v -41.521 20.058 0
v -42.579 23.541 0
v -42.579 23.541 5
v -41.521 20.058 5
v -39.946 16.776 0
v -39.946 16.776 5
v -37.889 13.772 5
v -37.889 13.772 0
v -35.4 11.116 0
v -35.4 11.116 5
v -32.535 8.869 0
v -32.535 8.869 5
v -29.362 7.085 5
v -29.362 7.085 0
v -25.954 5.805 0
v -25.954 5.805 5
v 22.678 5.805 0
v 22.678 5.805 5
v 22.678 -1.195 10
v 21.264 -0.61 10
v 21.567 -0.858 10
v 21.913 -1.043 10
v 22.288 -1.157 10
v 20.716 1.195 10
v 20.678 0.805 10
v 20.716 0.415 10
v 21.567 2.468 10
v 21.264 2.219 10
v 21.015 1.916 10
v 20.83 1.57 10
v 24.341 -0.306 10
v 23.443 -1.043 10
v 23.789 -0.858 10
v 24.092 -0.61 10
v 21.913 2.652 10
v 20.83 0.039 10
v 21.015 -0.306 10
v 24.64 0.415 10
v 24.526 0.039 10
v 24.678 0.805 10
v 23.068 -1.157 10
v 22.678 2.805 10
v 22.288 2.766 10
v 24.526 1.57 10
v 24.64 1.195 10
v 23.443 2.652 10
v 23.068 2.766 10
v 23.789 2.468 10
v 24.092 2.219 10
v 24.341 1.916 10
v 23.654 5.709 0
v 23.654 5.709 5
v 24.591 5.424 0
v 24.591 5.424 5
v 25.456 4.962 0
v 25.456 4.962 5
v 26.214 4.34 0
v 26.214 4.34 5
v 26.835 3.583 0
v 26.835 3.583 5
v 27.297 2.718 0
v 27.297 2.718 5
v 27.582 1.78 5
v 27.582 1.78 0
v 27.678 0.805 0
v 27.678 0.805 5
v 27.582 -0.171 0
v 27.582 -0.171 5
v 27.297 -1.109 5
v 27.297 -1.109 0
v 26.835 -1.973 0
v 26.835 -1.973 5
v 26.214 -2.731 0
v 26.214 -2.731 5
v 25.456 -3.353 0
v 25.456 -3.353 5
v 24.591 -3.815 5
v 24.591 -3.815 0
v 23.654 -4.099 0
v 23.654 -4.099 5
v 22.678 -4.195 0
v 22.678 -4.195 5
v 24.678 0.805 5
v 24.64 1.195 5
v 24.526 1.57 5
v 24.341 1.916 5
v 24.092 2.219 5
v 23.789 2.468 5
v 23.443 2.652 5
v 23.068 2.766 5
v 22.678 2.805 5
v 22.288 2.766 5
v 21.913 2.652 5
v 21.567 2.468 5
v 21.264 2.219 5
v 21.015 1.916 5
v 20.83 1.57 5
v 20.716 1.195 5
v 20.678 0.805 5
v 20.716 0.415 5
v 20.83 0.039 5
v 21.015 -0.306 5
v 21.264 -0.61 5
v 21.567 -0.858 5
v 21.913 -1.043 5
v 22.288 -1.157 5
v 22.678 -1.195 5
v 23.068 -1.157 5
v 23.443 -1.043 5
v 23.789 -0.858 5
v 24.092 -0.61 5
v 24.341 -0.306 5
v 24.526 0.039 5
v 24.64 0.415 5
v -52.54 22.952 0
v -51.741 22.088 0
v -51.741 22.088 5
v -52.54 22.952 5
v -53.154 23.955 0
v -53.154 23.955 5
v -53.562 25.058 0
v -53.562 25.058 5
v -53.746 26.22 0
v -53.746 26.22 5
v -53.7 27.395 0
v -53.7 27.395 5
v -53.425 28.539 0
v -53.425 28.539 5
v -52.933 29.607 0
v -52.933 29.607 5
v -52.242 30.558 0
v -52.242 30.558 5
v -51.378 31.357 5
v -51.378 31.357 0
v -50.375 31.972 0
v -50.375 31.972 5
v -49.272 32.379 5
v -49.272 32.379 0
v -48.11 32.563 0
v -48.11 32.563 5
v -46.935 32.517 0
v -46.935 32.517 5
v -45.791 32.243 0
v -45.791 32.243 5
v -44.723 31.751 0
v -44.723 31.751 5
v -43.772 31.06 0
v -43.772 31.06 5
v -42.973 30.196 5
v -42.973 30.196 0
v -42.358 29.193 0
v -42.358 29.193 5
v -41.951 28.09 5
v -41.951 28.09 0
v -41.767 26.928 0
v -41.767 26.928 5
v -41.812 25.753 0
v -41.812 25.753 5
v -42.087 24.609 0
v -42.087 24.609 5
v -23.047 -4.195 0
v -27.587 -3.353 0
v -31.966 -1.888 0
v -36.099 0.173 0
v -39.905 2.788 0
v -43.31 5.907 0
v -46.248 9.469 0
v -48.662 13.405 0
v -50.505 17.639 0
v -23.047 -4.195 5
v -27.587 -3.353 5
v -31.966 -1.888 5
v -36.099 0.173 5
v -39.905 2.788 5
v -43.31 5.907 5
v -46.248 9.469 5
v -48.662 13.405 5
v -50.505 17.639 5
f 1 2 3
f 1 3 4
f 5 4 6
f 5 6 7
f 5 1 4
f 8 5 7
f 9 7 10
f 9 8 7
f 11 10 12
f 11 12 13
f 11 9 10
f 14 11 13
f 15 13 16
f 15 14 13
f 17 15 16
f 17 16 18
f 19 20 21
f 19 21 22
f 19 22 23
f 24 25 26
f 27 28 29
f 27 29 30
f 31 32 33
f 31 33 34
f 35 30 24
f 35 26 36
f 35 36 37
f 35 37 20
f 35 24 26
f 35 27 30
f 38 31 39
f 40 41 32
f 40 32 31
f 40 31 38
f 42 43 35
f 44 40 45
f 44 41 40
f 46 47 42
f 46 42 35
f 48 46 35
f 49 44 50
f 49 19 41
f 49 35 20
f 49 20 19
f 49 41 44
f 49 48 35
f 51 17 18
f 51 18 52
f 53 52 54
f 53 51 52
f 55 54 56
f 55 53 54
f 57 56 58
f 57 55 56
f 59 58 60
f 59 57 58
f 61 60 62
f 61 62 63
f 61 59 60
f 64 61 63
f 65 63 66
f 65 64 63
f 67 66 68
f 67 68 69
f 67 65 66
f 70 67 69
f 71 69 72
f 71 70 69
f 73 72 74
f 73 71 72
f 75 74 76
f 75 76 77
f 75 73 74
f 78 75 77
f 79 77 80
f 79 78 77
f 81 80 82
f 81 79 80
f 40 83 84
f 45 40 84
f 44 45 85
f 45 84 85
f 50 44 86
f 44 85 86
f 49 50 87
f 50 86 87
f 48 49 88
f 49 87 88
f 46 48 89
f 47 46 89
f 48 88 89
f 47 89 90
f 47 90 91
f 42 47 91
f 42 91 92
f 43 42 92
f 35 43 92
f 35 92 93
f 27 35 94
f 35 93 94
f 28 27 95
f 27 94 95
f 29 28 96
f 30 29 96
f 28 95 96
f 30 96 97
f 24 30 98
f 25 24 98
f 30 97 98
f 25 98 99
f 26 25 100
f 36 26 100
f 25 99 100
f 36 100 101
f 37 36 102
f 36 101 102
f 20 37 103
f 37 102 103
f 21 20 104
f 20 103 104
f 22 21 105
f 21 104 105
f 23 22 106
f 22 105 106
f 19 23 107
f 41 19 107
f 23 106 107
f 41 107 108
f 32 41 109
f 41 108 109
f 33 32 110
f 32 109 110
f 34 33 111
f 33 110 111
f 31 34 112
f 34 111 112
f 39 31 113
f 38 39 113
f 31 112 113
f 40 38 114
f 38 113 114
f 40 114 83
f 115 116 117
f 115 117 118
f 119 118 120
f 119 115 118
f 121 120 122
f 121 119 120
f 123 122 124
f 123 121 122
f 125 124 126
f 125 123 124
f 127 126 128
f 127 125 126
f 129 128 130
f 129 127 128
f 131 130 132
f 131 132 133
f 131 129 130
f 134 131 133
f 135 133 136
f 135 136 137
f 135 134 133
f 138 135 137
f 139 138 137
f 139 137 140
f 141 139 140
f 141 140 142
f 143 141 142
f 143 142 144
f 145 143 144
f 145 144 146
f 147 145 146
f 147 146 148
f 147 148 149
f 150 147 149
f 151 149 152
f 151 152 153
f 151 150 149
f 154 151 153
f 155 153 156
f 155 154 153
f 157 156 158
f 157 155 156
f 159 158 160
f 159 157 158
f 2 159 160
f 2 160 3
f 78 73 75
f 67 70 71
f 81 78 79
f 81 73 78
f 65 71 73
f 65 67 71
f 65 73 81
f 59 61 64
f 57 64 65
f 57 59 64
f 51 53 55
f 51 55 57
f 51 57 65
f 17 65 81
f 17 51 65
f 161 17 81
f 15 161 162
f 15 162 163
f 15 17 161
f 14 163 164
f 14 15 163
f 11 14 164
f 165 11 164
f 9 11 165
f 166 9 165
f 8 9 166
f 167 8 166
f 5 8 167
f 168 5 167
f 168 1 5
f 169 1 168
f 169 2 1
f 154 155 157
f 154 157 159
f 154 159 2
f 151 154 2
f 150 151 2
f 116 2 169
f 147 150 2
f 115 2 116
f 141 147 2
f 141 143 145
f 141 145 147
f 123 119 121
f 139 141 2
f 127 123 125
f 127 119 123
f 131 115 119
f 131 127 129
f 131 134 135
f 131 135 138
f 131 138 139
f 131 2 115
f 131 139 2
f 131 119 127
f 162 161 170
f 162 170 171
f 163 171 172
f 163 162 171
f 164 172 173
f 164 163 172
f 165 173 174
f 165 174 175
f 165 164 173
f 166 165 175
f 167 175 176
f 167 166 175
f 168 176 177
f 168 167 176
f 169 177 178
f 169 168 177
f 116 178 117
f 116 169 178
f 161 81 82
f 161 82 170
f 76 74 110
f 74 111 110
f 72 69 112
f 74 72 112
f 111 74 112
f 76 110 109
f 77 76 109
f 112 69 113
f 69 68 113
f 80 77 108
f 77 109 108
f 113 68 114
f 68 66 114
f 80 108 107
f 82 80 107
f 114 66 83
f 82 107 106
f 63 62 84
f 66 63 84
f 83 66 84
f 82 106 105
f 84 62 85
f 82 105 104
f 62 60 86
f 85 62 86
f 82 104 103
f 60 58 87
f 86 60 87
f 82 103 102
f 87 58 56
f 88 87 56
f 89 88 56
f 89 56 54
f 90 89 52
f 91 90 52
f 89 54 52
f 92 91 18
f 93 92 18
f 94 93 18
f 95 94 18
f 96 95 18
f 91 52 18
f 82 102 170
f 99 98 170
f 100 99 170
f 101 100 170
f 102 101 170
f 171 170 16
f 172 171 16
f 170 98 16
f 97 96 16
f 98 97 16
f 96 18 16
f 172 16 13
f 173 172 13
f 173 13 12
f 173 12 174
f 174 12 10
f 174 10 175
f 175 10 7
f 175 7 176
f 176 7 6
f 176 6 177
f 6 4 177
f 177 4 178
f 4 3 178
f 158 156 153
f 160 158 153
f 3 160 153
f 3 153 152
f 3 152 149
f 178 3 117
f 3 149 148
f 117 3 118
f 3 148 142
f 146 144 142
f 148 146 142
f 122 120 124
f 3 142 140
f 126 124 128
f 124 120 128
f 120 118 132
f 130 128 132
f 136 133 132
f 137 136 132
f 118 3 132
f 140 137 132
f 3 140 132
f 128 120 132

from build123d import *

# Parameters (mm, degrees)
SALIENTE_EXTRUIR1_DEPTH = 5
CROQUIS2_R              = 2
SALIENTE_EXTRUIR2_DEPTH = 5


with BuildPart() as part:
    # Croquis1 → Saliente-Extruir1 (new body)
    with BuildSketch(Plane.XY):
        with BuildLine():
            Line((-25.953664325, 5.804713338), (22.678050908, 5.804713338))
            ThreePointArc((22.678050908, 5.804713338), (27.678050908, 0.804713338), (22.678050908, -4.195286662))
            Line((22.678050908, -4.195286662), (-23.047151147, -4.195286662))
            ThreePointArc((-23.047151147, -4.195286662), (-41.661617991, 4.287687085), (-51.741257509, 22.088251307))
            ThreePointArc((-51.741257509, 22.088251307), (-48.695784379, 32.499543684), (-42.578743977, 23.541210565))
            ThreePointArc((-42.578743977, 23.541210565), (-36.695300038, 12.396079877), (-25.953664325, 5.804713338))
        make_face()
    extrude(amount=SALIENTE_EXTRUIR1_DEPTH)

    # Croquis2 → Saliente-Extruir2 (add)
    with BuildSketch(Plane.XY.offset(5)):
        with Locations((22.678050908, 0.804713338)):
            Circle(CROQUIS2_R)
    extrude(amount=SALIENTE_EXTRUIR2_DEPTH)


solid = part.part
